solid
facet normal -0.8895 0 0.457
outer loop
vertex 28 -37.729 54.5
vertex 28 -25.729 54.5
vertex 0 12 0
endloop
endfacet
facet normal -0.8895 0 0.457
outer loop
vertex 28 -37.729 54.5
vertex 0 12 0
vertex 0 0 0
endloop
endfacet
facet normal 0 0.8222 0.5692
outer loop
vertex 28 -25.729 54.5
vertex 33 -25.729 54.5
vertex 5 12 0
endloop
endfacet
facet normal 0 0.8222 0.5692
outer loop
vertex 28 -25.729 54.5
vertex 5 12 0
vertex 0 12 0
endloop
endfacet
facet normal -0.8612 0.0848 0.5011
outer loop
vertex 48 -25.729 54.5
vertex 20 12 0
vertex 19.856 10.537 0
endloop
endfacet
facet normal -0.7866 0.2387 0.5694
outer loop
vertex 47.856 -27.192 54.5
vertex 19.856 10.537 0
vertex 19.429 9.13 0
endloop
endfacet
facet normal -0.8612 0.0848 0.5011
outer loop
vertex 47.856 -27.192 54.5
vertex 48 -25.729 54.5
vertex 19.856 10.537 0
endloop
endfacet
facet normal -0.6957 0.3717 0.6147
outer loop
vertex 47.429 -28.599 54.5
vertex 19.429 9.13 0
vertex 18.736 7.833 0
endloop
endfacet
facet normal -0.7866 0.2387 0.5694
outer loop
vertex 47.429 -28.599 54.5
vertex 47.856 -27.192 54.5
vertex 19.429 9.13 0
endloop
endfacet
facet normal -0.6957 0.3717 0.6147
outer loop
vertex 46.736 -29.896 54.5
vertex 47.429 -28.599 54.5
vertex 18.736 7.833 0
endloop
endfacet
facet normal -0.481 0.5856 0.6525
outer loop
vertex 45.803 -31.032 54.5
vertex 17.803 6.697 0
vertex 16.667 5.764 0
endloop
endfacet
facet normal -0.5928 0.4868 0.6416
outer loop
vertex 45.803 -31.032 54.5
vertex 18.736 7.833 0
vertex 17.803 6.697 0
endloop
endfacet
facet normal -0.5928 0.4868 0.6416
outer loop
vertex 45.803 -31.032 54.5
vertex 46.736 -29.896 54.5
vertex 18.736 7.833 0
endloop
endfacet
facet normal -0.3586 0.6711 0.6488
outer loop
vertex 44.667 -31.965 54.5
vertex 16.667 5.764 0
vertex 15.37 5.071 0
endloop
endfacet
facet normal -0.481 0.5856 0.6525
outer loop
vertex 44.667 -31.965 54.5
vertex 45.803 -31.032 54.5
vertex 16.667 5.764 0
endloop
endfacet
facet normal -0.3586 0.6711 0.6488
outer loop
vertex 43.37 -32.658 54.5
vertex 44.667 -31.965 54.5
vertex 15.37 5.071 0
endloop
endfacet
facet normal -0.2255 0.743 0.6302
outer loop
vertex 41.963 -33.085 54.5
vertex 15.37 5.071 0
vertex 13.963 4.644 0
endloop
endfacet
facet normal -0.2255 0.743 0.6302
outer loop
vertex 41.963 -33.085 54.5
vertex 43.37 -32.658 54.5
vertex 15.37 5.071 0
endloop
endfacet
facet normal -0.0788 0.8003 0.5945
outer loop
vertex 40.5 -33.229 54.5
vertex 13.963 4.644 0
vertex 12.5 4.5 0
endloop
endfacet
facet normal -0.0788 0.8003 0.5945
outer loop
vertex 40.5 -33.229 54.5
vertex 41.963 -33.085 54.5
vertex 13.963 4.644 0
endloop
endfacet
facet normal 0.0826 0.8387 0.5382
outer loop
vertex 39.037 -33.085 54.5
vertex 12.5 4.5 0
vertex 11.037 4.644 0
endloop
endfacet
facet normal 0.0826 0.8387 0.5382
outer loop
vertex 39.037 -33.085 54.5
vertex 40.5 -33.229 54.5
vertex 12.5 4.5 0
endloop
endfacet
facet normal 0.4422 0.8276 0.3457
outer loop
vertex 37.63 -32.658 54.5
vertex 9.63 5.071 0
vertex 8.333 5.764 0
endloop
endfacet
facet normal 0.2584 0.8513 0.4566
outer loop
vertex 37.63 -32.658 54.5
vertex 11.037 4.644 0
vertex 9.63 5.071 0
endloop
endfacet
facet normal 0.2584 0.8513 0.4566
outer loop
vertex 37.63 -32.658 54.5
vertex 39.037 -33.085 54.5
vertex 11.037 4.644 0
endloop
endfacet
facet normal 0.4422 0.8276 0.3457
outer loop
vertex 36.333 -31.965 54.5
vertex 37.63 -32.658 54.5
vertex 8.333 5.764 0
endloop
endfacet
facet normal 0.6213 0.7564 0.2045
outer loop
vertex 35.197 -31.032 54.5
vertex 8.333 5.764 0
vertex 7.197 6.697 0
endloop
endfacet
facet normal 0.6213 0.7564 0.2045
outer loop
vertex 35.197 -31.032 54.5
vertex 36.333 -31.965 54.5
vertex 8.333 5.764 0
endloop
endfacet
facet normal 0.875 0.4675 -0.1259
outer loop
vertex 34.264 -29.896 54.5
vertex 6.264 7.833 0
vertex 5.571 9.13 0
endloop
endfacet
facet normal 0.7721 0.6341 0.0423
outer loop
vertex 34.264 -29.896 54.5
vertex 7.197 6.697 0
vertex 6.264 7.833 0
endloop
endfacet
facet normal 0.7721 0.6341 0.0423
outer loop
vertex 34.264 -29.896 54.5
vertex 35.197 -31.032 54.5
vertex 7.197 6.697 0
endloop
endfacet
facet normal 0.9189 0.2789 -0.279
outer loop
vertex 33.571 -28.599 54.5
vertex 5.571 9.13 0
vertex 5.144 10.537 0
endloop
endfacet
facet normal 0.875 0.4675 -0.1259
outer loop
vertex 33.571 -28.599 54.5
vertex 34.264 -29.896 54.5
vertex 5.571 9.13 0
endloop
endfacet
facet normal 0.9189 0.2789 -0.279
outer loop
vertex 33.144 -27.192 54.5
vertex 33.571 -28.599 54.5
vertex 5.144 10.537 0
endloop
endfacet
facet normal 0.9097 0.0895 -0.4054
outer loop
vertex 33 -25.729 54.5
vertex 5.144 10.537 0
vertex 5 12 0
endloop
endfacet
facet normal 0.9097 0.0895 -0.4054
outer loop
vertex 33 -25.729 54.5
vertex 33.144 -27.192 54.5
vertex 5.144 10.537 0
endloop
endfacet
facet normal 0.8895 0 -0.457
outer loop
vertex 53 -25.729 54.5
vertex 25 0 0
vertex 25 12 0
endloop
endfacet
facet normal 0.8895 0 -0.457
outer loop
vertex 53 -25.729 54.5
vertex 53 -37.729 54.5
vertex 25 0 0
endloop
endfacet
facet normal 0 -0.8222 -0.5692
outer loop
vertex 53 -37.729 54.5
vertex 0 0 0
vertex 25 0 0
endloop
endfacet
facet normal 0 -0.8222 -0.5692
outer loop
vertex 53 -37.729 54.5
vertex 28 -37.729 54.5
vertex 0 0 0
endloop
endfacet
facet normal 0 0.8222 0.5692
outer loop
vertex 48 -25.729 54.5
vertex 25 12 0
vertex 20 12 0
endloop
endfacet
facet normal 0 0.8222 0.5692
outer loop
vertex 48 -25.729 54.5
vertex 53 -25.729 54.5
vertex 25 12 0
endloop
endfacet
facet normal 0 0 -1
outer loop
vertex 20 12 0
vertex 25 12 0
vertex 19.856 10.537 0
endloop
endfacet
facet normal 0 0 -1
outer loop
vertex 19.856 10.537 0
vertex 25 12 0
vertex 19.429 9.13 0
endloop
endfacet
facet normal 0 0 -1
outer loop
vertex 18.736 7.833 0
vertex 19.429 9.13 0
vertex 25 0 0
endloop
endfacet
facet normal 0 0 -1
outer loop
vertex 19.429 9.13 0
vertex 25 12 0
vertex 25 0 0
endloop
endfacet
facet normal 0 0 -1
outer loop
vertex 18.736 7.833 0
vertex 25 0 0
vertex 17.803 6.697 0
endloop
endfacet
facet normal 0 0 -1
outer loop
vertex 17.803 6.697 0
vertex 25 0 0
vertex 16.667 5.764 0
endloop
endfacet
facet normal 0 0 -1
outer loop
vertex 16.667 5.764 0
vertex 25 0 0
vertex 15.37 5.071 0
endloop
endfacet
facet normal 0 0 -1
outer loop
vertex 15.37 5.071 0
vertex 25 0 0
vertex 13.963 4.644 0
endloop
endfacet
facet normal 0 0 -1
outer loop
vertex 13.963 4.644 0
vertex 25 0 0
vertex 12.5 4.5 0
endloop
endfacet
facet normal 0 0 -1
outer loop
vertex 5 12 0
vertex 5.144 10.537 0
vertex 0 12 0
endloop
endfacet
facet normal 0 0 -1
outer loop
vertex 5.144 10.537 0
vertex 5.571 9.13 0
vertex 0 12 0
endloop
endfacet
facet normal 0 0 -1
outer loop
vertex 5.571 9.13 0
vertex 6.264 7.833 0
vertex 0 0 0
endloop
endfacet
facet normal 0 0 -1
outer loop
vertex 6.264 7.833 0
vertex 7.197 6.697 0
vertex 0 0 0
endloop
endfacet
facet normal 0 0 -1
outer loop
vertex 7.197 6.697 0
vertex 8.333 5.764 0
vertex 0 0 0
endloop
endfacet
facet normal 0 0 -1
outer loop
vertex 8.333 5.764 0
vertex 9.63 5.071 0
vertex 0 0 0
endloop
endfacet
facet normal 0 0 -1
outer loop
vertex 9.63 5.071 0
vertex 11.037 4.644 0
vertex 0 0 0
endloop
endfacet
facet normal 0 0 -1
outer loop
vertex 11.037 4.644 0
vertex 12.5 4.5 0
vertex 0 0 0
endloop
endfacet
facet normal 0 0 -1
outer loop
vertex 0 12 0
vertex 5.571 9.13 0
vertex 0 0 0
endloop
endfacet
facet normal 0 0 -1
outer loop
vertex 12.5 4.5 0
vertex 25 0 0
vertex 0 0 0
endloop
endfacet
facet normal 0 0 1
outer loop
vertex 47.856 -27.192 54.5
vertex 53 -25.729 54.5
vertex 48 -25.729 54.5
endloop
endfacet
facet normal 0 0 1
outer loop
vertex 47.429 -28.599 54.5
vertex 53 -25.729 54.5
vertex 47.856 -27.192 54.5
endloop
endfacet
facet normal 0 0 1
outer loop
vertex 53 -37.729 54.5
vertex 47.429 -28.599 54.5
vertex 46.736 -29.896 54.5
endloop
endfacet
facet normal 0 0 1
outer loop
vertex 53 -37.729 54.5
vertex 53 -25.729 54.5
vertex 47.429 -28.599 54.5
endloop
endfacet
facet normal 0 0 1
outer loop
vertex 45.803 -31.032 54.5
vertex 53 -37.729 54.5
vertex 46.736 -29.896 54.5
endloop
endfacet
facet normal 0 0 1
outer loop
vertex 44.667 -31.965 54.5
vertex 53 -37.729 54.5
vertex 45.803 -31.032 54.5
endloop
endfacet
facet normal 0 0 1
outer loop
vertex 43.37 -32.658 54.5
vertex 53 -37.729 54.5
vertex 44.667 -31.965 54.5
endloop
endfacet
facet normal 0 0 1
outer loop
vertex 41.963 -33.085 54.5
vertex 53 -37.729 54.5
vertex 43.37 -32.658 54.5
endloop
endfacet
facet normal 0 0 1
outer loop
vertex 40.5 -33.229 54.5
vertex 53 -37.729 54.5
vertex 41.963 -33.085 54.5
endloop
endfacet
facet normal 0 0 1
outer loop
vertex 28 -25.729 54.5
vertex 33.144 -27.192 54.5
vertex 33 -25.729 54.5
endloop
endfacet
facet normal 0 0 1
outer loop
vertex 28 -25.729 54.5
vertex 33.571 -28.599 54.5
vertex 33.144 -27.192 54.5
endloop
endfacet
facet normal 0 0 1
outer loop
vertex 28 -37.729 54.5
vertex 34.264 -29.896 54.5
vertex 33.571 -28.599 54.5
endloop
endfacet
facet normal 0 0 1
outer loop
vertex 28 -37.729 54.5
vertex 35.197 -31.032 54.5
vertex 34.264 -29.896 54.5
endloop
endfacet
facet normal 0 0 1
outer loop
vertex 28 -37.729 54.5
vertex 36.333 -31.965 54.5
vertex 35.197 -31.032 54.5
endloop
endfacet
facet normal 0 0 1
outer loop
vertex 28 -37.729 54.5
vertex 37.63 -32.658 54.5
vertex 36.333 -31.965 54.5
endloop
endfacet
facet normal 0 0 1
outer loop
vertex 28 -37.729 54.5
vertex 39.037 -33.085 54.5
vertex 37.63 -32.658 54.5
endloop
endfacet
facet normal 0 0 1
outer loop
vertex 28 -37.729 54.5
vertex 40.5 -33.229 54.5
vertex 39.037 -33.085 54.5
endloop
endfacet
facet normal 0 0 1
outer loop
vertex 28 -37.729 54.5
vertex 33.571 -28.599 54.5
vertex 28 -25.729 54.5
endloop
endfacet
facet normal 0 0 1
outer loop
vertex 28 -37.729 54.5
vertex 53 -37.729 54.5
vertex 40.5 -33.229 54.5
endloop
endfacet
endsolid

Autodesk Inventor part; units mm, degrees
ref_plane "YZ Plane" through (0, 0, 0) normal (1, 0, 0) x (0, 1, 0)
ref_plane "XZ Plane" through (0, 0, 0) normal (0, 1, 0) x (-1, 0, 0)
sketch "Sketch2" plane through (0, 0, 0) normal (0, 0, 1) x (1, 0, 0)
  line L0 (0, 0) -> (25, 0)
  line L1 (25, 0) -> (25, 12)
  line L2 (0, 12) -> (0, 0)
  line L3 (0, 12) -> (5, 12)
  line L4 (25, 12) -> (20, 12)
  arc A0 (5, 12) -> (20, 12) centre (12.5, 12) ccw
  dimension "d1" = 25
  dimension "d2" = 12
  dimension "d3" = 5
  dimension "d4" = 5
  dimension "d5" = 7.5
ref_plane "Work Plane1" through (0, 0, 54.5) normal (0, 0, 1) x (1, 0, 0)
sketch "Sketch3" plane through (0, 0, 54.5) normal (0, 0, 1) x (1, 0, 0)
  line L0 (28, -25.729) -> (33, -25.729)
  line L1 (28, -25.729) -> (28, -37.729)
  line L2 (28, -37.729) -> (53, -37.729)
  line L3 (53, -37.729) -> (53, -25.729)
  line L4 (53, -25.729) -> (48, -25.729)
  arc A0 (33, -25.729) -> (48, -25.729) centre (40.5, -25.729) ccw
  point P0 (0, 0)
  dimension "d15" = 5
  dimension "d17" = 25
  dimension "d19" = 5
  dimension "d22" = 7.5
  dimension "d28" = 12
loft "Loft1" add profiles "Sketch2", "Sketch3"
sketch "Sketch4" plane through (0, 0, 0) normal (-0.8895, 0, 0.457) x (0.457, 0, 0.8895)
  point P0 (0, 0)
properties part number "Ramp Main"
